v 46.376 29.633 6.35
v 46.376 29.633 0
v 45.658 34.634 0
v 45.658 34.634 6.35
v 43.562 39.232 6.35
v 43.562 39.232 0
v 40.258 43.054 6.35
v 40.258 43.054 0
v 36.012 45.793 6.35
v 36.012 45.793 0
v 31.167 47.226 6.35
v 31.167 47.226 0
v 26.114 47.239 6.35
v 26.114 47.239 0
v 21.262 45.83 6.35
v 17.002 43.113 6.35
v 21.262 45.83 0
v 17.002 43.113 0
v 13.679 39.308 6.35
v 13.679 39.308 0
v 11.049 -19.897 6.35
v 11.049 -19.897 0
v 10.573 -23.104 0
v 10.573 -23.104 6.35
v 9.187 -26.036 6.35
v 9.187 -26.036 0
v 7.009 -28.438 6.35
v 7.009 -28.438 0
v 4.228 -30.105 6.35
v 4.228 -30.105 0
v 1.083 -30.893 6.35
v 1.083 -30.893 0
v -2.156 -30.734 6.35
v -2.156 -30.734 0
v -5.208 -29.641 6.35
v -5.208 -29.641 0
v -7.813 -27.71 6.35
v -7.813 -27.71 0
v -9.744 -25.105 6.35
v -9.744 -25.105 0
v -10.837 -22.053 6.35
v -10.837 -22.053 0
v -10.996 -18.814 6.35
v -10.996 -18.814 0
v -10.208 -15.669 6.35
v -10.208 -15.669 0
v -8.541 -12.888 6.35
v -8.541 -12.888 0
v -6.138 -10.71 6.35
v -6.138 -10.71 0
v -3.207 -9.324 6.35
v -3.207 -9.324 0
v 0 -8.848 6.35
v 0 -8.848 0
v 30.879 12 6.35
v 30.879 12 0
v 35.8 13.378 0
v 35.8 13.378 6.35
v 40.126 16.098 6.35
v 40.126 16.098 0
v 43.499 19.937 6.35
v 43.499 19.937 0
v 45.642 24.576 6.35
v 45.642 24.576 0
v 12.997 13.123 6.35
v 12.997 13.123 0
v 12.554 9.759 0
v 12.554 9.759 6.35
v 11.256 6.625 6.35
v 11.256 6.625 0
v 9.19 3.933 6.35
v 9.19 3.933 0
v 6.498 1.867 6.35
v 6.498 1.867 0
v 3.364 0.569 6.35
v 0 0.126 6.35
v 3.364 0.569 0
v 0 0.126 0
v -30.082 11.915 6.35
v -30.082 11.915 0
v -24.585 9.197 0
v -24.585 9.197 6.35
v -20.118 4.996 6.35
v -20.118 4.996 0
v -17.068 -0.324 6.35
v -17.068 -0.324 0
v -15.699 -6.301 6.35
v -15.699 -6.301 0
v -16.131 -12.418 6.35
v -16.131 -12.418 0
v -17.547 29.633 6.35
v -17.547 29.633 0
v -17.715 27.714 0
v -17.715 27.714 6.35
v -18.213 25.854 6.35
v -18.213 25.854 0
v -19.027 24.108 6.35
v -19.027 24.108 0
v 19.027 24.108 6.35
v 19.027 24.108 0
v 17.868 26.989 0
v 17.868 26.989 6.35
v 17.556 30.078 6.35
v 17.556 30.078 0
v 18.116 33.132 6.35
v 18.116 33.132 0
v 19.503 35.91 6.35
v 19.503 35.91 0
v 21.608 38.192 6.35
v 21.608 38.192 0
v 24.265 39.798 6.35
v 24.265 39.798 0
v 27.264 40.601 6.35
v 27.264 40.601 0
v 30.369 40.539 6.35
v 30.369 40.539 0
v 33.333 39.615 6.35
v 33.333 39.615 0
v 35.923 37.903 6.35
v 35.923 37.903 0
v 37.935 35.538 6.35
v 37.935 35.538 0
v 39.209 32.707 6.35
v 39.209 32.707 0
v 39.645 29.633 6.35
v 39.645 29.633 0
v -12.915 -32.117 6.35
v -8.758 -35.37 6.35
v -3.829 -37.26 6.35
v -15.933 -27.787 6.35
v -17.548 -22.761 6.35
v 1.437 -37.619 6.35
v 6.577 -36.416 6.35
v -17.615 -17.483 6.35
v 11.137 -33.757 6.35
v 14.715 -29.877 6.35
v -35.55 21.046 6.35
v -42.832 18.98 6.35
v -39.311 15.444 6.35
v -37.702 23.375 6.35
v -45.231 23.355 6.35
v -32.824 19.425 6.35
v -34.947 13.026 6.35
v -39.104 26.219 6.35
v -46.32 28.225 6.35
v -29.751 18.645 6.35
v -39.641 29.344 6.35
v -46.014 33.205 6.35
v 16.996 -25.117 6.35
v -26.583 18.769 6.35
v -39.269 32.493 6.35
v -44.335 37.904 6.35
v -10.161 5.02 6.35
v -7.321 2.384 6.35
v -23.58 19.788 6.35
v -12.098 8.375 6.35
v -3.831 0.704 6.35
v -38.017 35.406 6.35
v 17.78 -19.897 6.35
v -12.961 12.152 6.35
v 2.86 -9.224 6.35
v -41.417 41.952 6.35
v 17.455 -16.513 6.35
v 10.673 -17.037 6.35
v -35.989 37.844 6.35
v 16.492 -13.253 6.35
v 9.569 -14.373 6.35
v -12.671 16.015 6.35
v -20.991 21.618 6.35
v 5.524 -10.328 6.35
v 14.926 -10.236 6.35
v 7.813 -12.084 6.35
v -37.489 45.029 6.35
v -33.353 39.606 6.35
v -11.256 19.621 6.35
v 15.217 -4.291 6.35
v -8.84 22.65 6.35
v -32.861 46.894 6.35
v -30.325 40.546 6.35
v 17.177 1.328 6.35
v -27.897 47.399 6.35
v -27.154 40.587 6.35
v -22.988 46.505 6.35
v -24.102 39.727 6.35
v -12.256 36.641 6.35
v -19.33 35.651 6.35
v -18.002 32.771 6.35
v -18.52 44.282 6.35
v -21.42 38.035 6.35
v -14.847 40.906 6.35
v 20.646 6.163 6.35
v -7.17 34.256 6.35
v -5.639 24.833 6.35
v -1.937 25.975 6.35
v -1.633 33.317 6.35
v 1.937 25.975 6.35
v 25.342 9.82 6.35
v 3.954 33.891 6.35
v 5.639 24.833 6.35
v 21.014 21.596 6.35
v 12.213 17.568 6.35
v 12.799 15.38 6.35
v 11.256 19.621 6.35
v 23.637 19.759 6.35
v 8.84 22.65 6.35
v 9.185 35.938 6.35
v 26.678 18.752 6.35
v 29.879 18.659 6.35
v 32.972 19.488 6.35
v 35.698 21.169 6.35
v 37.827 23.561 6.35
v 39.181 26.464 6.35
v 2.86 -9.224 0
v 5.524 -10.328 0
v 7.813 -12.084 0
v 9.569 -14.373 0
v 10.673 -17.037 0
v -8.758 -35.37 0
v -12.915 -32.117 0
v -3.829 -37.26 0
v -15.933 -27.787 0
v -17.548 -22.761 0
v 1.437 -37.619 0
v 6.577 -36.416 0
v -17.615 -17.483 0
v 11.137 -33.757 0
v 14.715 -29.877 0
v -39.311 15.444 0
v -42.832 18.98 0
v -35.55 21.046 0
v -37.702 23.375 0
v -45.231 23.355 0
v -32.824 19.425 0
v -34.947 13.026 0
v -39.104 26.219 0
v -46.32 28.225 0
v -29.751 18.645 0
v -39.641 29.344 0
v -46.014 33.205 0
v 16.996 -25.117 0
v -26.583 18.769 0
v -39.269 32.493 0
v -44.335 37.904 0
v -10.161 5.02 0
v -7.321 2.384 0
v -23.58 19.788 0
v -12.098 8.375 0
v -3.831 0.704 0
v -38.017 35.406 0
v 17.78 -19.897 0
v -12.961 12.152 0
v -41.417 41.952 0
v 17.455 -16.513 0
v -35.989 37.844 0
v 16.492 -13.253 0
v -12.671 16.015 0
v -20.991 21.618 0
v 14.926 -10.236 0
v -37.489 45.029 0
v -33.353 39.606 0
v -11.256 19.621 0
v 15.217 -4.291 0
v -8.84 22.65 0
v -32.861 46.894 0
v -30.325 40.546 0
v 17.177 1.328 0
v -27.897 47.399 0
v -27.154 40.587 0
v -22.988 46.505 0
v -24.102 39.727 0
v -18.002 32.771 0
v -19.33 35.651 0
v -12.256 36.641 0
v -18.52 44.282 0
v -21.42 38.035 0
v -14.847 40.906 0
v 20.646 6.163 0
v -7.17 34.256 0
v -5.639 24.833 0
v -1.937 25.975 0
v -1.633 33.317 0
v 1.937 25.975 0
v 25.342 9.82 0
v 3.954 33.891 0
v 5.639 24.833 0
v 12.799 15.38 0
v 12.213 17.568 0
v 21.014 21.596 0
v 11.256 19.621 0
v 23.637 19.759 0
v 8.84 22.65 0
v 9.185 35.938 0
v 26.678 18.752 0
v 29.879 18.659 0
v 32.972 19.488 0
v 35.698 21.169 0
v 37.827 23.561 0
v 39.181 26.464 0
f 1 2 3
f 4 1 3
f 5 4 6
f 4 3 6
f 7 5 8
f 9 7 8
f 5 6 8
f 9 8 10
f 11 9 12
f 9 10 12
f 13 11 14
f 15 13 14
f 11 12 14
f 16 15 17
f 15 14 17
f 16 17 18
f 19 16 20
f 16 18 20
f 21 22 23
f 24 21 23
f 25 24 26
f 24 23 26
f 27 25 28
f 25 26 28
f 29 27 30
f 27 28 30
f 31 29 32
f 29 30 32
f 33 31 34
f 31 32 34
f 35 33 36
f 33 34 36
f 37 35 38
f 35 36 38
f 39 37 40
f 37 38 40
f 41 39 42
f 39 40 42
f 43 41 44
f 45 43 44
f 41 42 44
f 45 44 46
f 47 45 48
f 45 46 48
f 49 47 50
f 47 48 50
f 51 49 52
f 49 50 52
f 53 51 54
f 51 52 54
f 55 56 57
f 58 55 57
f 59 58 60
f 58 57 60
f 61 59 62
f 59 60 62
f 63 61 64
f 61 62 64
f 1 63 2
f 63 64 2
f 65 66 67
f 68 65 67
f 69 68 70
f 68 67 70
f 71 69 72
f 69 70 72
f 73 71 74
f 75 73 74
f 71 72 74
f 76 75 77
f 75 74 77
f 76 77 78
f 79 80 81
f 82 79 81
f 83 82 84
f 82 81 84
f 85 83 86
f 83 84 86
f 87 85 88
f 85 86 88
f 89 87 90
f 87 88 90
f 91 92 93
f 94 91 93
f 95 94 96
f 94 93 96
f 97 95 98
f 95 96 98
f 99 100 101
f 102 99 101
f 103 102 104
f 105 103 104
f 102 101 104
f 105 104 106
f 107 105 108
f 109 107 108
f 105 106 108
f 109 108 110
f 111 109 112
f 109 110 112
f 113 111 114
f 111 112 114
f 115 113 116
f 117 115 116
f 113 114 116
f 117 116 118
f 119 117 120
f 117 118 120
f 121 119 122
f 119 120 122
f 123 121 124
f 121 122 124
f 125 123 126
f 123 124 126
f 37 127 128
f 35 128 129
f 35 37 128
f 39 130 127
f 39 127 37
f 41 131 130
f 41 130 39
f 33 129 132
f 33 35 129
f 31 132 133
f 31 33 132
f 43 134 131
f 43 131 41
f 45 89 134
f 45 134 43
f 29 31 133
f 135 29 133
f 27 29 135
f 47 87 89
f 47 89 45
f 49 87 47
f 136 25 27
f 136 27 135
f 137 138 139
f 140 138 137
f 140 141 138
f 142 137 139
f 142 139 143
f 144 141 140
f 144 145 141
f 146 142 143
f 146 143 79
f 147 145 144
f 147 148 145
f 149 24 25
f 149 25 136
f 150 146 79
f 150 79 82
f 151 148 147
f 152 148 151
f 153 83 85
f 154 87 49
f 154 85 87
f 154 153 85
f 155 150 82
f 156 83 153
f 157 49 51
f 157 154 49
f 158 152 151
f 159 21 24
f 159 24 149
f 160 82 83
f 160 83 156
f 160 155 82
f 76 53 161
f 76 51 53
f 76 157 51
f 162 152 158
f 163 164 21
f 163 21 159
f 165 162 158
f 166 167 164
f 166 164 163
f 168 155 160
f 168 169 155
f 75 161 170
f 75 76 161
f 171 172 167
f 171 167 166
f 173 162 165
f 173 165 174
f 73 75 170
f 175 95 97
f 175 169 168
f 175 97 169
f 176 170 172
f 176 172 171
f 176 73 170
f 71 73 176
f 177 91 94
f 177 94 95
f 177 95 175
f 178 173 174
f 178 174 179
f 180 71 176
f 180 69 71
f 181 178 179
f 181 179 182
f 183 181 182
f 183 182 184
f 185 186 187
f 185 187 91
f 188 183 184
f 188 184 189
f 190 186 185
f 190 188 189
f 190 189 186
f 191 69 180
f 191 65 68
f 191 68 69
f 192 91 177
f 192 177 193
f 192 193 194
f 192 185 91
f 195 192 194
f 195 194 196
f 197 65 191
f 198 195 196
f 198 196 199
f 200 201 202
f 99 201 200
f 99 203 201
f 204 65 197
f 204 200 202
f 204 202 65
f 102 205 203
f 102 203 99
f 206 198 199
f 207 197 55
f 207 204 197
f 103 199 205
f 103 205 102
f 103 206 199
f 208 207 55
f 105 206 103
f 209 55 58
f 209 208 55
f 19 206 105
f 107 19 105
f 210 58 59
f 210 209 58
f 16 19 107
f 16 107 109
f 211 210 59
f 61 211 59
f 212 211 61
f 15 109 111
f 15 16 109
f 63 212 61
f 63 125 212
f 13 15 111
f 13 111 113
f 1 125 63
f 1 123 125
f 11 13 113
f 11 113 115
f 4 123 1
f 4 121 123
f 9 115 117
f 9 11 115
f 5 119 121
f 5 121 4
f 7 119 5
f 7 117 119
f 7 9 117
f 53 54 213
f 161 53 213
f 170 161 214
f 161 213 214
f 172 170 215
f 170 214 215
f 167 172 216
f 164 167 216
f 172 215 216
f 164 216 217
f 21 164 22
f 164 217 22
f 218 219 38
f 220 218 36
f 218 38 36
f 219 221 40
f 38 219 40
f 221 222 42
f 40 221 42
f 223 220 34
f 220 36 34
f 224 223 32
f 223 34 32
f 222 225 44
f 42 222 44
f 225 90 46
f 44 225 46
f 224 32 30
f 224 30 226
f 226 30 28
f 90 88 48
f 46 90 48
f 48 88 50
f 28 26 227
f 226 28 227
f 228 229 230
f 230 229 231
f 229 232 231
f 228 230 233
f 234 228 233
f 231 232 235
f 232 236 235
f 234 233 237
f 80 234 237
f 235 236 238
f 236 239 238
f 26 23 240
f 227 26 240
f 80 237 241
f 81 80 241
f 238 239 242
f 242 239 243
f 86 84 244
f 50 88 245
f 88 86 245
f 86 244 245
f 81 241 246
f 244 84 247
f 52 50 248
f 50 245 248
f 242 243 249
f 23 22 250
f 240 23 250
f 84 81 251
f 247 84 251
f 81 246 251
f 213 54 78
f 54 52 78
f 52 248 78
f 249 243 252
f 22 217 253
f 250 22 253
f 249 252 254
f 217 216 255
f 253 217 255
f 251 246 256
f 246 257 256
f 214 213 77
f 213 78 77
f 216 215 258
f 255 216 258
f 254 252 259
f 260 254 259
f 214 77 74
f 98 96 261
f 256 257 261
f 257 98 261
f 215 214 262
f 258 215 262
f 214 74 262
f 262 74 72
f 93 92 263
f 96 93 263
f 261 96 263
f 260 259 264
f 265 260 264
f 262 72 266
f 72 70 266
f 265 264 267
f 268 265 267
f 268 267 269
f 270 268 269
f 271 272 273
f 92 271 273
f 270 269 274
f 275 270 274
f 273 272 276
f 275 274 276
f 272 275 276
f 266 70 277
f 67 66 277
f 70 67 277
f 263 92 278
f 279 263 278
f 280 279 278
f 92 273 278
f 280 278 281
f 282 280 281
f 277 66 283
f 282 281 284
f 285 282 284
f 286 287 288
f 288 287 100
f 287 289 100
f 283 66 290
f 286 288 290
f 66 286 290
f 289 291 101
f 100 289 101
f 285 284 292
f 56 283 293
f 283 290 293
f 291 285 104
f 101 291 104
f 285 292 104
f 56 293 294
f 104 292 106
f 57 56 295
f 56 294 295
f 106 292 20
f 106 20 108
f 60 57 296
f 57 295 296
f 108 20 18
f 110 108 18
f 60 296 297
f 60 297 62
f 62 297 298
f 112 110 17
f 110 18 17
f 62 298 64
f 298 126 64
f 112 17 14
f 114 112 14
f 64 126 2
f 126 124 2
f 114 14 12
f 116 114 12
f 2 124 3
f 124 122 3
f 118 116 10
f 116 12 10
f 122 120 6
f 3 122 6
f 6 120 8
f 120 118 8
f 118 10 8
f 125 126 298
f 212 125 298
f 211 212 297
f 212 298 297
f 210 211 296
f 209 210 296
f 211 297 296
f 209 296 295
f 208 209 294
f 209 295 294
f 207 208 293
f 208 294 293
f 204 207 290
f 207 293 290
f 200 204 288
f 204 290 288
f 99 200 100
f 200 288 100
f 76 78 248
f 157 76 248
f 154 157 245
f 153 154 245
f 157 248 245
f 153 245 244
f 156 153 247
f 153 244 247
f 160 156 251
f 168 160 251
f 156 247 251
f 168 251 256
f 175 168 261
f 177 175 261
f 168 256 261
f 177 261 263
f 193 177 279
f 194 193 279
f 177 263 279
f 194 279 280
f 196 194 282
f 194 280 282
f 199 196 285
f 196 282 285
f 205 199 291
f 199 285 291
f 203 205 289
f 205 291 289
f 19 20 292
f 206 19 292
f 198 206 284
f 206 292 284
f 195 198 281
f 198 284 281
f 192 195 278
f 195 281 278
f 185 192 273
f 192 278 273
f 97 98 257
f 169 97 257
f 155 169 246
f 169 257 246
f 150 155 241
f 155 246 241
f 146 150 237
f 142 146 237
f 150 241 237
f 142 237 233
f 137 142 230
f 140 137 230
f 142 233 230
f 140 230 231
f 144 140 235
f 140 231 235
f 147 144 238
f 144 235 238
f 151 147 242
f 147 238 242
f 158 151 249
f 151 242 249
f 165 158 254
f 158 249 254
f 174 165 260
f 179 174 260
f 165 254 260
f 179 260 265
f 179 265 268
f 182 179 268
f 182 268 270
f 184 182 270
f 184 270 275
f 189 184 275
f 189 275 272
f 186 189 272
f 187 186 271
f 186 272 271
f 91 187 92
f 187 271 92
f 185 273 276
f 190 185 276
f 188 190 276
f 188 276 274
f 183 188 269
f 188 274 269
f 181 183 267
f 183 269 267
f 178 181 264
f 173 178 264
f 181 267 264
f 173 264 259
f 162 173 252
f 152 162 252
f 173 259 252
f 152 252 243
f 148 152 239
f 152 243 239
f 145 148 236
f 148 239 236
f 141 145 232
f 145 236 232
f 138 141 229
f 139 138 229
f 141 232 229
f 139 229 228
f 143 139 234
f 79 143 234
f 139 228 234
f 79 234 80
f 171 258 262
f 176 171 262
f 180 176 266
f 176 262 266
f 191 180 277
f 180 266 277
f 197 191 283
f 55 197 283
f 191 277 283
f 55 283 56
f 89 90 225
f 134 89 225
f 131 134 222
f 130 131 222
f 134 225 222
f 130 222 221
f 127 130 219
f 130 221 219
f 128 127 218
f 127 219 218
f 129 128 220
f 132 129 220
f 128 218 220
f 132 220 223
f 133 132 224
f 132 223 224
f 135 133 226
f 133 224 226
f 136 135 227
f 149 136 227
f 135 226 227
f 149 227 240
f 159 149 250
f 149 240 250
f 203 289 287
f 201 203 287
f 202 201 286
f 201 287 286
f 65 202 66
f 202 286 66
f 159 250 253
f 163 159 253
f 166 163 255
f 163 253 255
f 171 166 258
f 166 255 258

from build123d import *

# Parameters (mm, degrees)
F1_DEPTH = 6.35


with BuildPart() as f1:
    # F0 (on Top) → F1 (new body)
    with BuildSketch(Plane.XY):
        with BuildLine():
            ThreePointArc((-30.0819607702, 11.9151759356), (-20.3578704511, 13.8767489709), (-13.1982271915, 20.7429859098))
            ThreePointArc((-13.1982271915, 20.7429859098), (-11.4219976513, 25.0311833169), (-10.816158833, 29.6329859753))
            ThreePointArc((-10.816158833, 29.6329859753), (-11.179762963, 33.2103530099), (-12.2557038161, 36.6414044732))
            ThreePointArc((-12.2557038161, 36.6414044732), (-43.0187721174, 40.03090048), (-30.0819607702, 11.9151759356))
        make_face()
        with BuildLine():
            ThreePointArc((-17.547158833, 29.6329859753), (-17.9236443783, 26.773294346), (-19.0274441465, 24.1084859753))
            ThreePointArc((-19.0274441465, 24.1084859753), (-39.2686732876, 32.4926776046), (-17.547158833, 29.6329859753))
        make_face(mode=Mode.SUBTRACT)
        with BuildLine():
            ThreePointArc((13.6786666056, 39.3075312177), (10.8221098654, 30.0929678224), (13.1982271824, 20.7429859256))
            ThreePointArc((13.1982271824, 20.7429859256), (20.7152486277, 13.6949919254), (30.8792758859, 12.0001819861))
            ThreePointArc((30.8792758859, 12.0001819861), (41.9513492322, 17.8955548509), (46.376158833, 29.6329859753))
            ThreePointArc((46.376158833, 29.6329859753), (33.6407295877, 46.6823468402), (13.6786666056, 39.3075312177))
        make_face()
        with BuildLine():
            ThreePointArc((39.645158833, 29.6329859753), (31.4558504623, 18.9604715206), (19.0274441465, 24.1084859753))
            ThreePointArc((19.0274441465, 24.1084859753), (25.7364672036, 40.30550043), (39.645158833, 29.6329859753))
        make_face(mode=Mode.SUBTRACT)
        with BuildLine():
            ThreePointArc((14.9259864768, -10.2355789505), (8.4955307169, -4.2779757112), (-3.9e-09, -2.1170140247))
            ThreePointArc((-3.9e-09, -2.1170140247), (-9.5695821881, -4.9119715908), (-16.1305506354, -12.4181279982))
            ThreePointArc((-16.1305506354, -12.4181279982), (-3.8293086649, -37.259755604), (17.78, -19.8970140247))
            ThreePointArc((17.78, -19.8970140247), (17.0515752873, -14.8599334991), (14.9259864768, -10.2355789505))
        make_face()
        with BuildLine():
            ThreePointArc((11.049, -19.8970140247), (-7.8128228253, -27.70983685), (0, -8.8480140247))
            ThreePointArc((0, -8.8480140247), (7.8128228253, -12.0841911994), (11.049, -19.8970140247))
        make_face(mode=Mode.SUBTRACT)
        with BuildLine():
            ThreePointArc((30.8792758859, 12.0001819861), (20.7152486277, 13.6949919254), (13.1982271824, 20.7429859256))
            ThreePointArc((13.1982271824, 20.7429859256), (14.7207096001, 17.0673881949), (15.24, 13.1229859753))
            ThreePointArc((15.24, 13.1229859753), (10.7763073439, 2.3466786287), (-3.9e-09, -2.1170140247))
            ThreePointArc((-3.9e-09, -2.1170140247), (8.4955307169, -4.2779757112), (14.9259864768, -10.2355789505))
            ThreePointArc((14.9259864768, -10.2355789505), (18.7381800343, 3.8701324523), (30.8792758859, 12.0001819861))
        make_face()
        with BuildLine():
            ThreePointArc((-13.1982271915, 20.7429859098), (-9.1e-09, 28.3629859753), (13.1982271824, 20.7429859256))
            ThreePointArc((13.1982271824, 20.7429859256), (10.8221098654, 30.0929678224), (13.6786666056, 39.3075312177))
            ThreePointArc((13.6786666056, 39.3075312177), (1.1802177429, 33.4149013853), (-12.2557038161, 36.6414044732))
            ThreePointArc((-12.2557038161, 36.6414044732), (-11.179762963, 33.2103530099), (-10.816158833, 29.6329859753))
            ThreePointArc((-10.816158833, 29.6329859753), (-11.4219976513, 25.0311833169), (-13.1982271915, 20.7429859098))
        make_face()
        with BuildLine():
            ThreePointArc((-16.1305506354, -12.4181279982), (-9.5695821881, -4.9119715908), (-3.9e-09, -2.1170140247))
            ThreePointArc((-3.9e-09, -2.1170140247), (-13.1982271357, 5.5029859442), (-13.1982271915, 20.7429859098))
            ThreePointArc((-13.1982271915, 20.7429859098), (-20.3578704511, 13.8767489709), (-30.0819607702, 11.9151759356))
            ThreePointArc((-30.0819607702, 11.9151759356), (-18.3961354972, 2.4490540304), (-16.1305506354, -12.4181279982))
        make_face()
        with BuildLine():
            Line((0, -2.1170140247), (0, 0.1261395605))
            ThreePointArc((0, 0.1261395605), (-11.2555991643, 6.6245627679), (-11.2555991643, 19.6214091827))
            Line((-11.2555991643, 19.6214091827), (-13.1982271537, 20.7429859753))
            ThreePointArc((-13.1982271915, 20.7429859098), (-13.1982271357, 5.5029859442), (-3.9e-09, -2.1170140247))
        make_face()
        with BuildLine():
            ThreePointArc((-11.2555991643, 19.6214091827), (0, 26.1198323901), (11.2555991643, 19.6214091827))
            Line((11.2555991643, 19.6214091827), (13.1982271537, 20.7429859753))
            ThreePointArc((13.1982271824, 20.7429859256), (-9.1e-09, 28.3629859753), (-13.1982271915, 20.7429859098))
            Line((-13.1982271537, 20.7429859753), (-11.2555991643, 19.6214091827))
        make_face()
        with BuildLine():
            ThreePointArc((11.2555991643, 19.6214091827), (12.5539896124, 16.4868173537), (12.9968464148, 13.1229859753))
            ThreePointArc((12.9968464148, 13.1229859753), (9.190158234, 3.9328277413), (0, 0.1261395605))
            Line((0, 0.1261395605), (0, -2.1170140247))
            ThreePointArc((-3.9e-09, -2.1170140247), (10.7763073439, 2.3466786287), (15.24, 13.1229859753))
            ThreePointArc((15.24, 13.1229859753), (14.7207096001, 17.0673881949), (13.1982271824, 20.7429859256))
            Line((13.1982271537, 20.7429859753), (11.2555991643, 19.6214091827))
        make_face()
    extrude(amount=F1_DEPTH)


solid = f1.part
